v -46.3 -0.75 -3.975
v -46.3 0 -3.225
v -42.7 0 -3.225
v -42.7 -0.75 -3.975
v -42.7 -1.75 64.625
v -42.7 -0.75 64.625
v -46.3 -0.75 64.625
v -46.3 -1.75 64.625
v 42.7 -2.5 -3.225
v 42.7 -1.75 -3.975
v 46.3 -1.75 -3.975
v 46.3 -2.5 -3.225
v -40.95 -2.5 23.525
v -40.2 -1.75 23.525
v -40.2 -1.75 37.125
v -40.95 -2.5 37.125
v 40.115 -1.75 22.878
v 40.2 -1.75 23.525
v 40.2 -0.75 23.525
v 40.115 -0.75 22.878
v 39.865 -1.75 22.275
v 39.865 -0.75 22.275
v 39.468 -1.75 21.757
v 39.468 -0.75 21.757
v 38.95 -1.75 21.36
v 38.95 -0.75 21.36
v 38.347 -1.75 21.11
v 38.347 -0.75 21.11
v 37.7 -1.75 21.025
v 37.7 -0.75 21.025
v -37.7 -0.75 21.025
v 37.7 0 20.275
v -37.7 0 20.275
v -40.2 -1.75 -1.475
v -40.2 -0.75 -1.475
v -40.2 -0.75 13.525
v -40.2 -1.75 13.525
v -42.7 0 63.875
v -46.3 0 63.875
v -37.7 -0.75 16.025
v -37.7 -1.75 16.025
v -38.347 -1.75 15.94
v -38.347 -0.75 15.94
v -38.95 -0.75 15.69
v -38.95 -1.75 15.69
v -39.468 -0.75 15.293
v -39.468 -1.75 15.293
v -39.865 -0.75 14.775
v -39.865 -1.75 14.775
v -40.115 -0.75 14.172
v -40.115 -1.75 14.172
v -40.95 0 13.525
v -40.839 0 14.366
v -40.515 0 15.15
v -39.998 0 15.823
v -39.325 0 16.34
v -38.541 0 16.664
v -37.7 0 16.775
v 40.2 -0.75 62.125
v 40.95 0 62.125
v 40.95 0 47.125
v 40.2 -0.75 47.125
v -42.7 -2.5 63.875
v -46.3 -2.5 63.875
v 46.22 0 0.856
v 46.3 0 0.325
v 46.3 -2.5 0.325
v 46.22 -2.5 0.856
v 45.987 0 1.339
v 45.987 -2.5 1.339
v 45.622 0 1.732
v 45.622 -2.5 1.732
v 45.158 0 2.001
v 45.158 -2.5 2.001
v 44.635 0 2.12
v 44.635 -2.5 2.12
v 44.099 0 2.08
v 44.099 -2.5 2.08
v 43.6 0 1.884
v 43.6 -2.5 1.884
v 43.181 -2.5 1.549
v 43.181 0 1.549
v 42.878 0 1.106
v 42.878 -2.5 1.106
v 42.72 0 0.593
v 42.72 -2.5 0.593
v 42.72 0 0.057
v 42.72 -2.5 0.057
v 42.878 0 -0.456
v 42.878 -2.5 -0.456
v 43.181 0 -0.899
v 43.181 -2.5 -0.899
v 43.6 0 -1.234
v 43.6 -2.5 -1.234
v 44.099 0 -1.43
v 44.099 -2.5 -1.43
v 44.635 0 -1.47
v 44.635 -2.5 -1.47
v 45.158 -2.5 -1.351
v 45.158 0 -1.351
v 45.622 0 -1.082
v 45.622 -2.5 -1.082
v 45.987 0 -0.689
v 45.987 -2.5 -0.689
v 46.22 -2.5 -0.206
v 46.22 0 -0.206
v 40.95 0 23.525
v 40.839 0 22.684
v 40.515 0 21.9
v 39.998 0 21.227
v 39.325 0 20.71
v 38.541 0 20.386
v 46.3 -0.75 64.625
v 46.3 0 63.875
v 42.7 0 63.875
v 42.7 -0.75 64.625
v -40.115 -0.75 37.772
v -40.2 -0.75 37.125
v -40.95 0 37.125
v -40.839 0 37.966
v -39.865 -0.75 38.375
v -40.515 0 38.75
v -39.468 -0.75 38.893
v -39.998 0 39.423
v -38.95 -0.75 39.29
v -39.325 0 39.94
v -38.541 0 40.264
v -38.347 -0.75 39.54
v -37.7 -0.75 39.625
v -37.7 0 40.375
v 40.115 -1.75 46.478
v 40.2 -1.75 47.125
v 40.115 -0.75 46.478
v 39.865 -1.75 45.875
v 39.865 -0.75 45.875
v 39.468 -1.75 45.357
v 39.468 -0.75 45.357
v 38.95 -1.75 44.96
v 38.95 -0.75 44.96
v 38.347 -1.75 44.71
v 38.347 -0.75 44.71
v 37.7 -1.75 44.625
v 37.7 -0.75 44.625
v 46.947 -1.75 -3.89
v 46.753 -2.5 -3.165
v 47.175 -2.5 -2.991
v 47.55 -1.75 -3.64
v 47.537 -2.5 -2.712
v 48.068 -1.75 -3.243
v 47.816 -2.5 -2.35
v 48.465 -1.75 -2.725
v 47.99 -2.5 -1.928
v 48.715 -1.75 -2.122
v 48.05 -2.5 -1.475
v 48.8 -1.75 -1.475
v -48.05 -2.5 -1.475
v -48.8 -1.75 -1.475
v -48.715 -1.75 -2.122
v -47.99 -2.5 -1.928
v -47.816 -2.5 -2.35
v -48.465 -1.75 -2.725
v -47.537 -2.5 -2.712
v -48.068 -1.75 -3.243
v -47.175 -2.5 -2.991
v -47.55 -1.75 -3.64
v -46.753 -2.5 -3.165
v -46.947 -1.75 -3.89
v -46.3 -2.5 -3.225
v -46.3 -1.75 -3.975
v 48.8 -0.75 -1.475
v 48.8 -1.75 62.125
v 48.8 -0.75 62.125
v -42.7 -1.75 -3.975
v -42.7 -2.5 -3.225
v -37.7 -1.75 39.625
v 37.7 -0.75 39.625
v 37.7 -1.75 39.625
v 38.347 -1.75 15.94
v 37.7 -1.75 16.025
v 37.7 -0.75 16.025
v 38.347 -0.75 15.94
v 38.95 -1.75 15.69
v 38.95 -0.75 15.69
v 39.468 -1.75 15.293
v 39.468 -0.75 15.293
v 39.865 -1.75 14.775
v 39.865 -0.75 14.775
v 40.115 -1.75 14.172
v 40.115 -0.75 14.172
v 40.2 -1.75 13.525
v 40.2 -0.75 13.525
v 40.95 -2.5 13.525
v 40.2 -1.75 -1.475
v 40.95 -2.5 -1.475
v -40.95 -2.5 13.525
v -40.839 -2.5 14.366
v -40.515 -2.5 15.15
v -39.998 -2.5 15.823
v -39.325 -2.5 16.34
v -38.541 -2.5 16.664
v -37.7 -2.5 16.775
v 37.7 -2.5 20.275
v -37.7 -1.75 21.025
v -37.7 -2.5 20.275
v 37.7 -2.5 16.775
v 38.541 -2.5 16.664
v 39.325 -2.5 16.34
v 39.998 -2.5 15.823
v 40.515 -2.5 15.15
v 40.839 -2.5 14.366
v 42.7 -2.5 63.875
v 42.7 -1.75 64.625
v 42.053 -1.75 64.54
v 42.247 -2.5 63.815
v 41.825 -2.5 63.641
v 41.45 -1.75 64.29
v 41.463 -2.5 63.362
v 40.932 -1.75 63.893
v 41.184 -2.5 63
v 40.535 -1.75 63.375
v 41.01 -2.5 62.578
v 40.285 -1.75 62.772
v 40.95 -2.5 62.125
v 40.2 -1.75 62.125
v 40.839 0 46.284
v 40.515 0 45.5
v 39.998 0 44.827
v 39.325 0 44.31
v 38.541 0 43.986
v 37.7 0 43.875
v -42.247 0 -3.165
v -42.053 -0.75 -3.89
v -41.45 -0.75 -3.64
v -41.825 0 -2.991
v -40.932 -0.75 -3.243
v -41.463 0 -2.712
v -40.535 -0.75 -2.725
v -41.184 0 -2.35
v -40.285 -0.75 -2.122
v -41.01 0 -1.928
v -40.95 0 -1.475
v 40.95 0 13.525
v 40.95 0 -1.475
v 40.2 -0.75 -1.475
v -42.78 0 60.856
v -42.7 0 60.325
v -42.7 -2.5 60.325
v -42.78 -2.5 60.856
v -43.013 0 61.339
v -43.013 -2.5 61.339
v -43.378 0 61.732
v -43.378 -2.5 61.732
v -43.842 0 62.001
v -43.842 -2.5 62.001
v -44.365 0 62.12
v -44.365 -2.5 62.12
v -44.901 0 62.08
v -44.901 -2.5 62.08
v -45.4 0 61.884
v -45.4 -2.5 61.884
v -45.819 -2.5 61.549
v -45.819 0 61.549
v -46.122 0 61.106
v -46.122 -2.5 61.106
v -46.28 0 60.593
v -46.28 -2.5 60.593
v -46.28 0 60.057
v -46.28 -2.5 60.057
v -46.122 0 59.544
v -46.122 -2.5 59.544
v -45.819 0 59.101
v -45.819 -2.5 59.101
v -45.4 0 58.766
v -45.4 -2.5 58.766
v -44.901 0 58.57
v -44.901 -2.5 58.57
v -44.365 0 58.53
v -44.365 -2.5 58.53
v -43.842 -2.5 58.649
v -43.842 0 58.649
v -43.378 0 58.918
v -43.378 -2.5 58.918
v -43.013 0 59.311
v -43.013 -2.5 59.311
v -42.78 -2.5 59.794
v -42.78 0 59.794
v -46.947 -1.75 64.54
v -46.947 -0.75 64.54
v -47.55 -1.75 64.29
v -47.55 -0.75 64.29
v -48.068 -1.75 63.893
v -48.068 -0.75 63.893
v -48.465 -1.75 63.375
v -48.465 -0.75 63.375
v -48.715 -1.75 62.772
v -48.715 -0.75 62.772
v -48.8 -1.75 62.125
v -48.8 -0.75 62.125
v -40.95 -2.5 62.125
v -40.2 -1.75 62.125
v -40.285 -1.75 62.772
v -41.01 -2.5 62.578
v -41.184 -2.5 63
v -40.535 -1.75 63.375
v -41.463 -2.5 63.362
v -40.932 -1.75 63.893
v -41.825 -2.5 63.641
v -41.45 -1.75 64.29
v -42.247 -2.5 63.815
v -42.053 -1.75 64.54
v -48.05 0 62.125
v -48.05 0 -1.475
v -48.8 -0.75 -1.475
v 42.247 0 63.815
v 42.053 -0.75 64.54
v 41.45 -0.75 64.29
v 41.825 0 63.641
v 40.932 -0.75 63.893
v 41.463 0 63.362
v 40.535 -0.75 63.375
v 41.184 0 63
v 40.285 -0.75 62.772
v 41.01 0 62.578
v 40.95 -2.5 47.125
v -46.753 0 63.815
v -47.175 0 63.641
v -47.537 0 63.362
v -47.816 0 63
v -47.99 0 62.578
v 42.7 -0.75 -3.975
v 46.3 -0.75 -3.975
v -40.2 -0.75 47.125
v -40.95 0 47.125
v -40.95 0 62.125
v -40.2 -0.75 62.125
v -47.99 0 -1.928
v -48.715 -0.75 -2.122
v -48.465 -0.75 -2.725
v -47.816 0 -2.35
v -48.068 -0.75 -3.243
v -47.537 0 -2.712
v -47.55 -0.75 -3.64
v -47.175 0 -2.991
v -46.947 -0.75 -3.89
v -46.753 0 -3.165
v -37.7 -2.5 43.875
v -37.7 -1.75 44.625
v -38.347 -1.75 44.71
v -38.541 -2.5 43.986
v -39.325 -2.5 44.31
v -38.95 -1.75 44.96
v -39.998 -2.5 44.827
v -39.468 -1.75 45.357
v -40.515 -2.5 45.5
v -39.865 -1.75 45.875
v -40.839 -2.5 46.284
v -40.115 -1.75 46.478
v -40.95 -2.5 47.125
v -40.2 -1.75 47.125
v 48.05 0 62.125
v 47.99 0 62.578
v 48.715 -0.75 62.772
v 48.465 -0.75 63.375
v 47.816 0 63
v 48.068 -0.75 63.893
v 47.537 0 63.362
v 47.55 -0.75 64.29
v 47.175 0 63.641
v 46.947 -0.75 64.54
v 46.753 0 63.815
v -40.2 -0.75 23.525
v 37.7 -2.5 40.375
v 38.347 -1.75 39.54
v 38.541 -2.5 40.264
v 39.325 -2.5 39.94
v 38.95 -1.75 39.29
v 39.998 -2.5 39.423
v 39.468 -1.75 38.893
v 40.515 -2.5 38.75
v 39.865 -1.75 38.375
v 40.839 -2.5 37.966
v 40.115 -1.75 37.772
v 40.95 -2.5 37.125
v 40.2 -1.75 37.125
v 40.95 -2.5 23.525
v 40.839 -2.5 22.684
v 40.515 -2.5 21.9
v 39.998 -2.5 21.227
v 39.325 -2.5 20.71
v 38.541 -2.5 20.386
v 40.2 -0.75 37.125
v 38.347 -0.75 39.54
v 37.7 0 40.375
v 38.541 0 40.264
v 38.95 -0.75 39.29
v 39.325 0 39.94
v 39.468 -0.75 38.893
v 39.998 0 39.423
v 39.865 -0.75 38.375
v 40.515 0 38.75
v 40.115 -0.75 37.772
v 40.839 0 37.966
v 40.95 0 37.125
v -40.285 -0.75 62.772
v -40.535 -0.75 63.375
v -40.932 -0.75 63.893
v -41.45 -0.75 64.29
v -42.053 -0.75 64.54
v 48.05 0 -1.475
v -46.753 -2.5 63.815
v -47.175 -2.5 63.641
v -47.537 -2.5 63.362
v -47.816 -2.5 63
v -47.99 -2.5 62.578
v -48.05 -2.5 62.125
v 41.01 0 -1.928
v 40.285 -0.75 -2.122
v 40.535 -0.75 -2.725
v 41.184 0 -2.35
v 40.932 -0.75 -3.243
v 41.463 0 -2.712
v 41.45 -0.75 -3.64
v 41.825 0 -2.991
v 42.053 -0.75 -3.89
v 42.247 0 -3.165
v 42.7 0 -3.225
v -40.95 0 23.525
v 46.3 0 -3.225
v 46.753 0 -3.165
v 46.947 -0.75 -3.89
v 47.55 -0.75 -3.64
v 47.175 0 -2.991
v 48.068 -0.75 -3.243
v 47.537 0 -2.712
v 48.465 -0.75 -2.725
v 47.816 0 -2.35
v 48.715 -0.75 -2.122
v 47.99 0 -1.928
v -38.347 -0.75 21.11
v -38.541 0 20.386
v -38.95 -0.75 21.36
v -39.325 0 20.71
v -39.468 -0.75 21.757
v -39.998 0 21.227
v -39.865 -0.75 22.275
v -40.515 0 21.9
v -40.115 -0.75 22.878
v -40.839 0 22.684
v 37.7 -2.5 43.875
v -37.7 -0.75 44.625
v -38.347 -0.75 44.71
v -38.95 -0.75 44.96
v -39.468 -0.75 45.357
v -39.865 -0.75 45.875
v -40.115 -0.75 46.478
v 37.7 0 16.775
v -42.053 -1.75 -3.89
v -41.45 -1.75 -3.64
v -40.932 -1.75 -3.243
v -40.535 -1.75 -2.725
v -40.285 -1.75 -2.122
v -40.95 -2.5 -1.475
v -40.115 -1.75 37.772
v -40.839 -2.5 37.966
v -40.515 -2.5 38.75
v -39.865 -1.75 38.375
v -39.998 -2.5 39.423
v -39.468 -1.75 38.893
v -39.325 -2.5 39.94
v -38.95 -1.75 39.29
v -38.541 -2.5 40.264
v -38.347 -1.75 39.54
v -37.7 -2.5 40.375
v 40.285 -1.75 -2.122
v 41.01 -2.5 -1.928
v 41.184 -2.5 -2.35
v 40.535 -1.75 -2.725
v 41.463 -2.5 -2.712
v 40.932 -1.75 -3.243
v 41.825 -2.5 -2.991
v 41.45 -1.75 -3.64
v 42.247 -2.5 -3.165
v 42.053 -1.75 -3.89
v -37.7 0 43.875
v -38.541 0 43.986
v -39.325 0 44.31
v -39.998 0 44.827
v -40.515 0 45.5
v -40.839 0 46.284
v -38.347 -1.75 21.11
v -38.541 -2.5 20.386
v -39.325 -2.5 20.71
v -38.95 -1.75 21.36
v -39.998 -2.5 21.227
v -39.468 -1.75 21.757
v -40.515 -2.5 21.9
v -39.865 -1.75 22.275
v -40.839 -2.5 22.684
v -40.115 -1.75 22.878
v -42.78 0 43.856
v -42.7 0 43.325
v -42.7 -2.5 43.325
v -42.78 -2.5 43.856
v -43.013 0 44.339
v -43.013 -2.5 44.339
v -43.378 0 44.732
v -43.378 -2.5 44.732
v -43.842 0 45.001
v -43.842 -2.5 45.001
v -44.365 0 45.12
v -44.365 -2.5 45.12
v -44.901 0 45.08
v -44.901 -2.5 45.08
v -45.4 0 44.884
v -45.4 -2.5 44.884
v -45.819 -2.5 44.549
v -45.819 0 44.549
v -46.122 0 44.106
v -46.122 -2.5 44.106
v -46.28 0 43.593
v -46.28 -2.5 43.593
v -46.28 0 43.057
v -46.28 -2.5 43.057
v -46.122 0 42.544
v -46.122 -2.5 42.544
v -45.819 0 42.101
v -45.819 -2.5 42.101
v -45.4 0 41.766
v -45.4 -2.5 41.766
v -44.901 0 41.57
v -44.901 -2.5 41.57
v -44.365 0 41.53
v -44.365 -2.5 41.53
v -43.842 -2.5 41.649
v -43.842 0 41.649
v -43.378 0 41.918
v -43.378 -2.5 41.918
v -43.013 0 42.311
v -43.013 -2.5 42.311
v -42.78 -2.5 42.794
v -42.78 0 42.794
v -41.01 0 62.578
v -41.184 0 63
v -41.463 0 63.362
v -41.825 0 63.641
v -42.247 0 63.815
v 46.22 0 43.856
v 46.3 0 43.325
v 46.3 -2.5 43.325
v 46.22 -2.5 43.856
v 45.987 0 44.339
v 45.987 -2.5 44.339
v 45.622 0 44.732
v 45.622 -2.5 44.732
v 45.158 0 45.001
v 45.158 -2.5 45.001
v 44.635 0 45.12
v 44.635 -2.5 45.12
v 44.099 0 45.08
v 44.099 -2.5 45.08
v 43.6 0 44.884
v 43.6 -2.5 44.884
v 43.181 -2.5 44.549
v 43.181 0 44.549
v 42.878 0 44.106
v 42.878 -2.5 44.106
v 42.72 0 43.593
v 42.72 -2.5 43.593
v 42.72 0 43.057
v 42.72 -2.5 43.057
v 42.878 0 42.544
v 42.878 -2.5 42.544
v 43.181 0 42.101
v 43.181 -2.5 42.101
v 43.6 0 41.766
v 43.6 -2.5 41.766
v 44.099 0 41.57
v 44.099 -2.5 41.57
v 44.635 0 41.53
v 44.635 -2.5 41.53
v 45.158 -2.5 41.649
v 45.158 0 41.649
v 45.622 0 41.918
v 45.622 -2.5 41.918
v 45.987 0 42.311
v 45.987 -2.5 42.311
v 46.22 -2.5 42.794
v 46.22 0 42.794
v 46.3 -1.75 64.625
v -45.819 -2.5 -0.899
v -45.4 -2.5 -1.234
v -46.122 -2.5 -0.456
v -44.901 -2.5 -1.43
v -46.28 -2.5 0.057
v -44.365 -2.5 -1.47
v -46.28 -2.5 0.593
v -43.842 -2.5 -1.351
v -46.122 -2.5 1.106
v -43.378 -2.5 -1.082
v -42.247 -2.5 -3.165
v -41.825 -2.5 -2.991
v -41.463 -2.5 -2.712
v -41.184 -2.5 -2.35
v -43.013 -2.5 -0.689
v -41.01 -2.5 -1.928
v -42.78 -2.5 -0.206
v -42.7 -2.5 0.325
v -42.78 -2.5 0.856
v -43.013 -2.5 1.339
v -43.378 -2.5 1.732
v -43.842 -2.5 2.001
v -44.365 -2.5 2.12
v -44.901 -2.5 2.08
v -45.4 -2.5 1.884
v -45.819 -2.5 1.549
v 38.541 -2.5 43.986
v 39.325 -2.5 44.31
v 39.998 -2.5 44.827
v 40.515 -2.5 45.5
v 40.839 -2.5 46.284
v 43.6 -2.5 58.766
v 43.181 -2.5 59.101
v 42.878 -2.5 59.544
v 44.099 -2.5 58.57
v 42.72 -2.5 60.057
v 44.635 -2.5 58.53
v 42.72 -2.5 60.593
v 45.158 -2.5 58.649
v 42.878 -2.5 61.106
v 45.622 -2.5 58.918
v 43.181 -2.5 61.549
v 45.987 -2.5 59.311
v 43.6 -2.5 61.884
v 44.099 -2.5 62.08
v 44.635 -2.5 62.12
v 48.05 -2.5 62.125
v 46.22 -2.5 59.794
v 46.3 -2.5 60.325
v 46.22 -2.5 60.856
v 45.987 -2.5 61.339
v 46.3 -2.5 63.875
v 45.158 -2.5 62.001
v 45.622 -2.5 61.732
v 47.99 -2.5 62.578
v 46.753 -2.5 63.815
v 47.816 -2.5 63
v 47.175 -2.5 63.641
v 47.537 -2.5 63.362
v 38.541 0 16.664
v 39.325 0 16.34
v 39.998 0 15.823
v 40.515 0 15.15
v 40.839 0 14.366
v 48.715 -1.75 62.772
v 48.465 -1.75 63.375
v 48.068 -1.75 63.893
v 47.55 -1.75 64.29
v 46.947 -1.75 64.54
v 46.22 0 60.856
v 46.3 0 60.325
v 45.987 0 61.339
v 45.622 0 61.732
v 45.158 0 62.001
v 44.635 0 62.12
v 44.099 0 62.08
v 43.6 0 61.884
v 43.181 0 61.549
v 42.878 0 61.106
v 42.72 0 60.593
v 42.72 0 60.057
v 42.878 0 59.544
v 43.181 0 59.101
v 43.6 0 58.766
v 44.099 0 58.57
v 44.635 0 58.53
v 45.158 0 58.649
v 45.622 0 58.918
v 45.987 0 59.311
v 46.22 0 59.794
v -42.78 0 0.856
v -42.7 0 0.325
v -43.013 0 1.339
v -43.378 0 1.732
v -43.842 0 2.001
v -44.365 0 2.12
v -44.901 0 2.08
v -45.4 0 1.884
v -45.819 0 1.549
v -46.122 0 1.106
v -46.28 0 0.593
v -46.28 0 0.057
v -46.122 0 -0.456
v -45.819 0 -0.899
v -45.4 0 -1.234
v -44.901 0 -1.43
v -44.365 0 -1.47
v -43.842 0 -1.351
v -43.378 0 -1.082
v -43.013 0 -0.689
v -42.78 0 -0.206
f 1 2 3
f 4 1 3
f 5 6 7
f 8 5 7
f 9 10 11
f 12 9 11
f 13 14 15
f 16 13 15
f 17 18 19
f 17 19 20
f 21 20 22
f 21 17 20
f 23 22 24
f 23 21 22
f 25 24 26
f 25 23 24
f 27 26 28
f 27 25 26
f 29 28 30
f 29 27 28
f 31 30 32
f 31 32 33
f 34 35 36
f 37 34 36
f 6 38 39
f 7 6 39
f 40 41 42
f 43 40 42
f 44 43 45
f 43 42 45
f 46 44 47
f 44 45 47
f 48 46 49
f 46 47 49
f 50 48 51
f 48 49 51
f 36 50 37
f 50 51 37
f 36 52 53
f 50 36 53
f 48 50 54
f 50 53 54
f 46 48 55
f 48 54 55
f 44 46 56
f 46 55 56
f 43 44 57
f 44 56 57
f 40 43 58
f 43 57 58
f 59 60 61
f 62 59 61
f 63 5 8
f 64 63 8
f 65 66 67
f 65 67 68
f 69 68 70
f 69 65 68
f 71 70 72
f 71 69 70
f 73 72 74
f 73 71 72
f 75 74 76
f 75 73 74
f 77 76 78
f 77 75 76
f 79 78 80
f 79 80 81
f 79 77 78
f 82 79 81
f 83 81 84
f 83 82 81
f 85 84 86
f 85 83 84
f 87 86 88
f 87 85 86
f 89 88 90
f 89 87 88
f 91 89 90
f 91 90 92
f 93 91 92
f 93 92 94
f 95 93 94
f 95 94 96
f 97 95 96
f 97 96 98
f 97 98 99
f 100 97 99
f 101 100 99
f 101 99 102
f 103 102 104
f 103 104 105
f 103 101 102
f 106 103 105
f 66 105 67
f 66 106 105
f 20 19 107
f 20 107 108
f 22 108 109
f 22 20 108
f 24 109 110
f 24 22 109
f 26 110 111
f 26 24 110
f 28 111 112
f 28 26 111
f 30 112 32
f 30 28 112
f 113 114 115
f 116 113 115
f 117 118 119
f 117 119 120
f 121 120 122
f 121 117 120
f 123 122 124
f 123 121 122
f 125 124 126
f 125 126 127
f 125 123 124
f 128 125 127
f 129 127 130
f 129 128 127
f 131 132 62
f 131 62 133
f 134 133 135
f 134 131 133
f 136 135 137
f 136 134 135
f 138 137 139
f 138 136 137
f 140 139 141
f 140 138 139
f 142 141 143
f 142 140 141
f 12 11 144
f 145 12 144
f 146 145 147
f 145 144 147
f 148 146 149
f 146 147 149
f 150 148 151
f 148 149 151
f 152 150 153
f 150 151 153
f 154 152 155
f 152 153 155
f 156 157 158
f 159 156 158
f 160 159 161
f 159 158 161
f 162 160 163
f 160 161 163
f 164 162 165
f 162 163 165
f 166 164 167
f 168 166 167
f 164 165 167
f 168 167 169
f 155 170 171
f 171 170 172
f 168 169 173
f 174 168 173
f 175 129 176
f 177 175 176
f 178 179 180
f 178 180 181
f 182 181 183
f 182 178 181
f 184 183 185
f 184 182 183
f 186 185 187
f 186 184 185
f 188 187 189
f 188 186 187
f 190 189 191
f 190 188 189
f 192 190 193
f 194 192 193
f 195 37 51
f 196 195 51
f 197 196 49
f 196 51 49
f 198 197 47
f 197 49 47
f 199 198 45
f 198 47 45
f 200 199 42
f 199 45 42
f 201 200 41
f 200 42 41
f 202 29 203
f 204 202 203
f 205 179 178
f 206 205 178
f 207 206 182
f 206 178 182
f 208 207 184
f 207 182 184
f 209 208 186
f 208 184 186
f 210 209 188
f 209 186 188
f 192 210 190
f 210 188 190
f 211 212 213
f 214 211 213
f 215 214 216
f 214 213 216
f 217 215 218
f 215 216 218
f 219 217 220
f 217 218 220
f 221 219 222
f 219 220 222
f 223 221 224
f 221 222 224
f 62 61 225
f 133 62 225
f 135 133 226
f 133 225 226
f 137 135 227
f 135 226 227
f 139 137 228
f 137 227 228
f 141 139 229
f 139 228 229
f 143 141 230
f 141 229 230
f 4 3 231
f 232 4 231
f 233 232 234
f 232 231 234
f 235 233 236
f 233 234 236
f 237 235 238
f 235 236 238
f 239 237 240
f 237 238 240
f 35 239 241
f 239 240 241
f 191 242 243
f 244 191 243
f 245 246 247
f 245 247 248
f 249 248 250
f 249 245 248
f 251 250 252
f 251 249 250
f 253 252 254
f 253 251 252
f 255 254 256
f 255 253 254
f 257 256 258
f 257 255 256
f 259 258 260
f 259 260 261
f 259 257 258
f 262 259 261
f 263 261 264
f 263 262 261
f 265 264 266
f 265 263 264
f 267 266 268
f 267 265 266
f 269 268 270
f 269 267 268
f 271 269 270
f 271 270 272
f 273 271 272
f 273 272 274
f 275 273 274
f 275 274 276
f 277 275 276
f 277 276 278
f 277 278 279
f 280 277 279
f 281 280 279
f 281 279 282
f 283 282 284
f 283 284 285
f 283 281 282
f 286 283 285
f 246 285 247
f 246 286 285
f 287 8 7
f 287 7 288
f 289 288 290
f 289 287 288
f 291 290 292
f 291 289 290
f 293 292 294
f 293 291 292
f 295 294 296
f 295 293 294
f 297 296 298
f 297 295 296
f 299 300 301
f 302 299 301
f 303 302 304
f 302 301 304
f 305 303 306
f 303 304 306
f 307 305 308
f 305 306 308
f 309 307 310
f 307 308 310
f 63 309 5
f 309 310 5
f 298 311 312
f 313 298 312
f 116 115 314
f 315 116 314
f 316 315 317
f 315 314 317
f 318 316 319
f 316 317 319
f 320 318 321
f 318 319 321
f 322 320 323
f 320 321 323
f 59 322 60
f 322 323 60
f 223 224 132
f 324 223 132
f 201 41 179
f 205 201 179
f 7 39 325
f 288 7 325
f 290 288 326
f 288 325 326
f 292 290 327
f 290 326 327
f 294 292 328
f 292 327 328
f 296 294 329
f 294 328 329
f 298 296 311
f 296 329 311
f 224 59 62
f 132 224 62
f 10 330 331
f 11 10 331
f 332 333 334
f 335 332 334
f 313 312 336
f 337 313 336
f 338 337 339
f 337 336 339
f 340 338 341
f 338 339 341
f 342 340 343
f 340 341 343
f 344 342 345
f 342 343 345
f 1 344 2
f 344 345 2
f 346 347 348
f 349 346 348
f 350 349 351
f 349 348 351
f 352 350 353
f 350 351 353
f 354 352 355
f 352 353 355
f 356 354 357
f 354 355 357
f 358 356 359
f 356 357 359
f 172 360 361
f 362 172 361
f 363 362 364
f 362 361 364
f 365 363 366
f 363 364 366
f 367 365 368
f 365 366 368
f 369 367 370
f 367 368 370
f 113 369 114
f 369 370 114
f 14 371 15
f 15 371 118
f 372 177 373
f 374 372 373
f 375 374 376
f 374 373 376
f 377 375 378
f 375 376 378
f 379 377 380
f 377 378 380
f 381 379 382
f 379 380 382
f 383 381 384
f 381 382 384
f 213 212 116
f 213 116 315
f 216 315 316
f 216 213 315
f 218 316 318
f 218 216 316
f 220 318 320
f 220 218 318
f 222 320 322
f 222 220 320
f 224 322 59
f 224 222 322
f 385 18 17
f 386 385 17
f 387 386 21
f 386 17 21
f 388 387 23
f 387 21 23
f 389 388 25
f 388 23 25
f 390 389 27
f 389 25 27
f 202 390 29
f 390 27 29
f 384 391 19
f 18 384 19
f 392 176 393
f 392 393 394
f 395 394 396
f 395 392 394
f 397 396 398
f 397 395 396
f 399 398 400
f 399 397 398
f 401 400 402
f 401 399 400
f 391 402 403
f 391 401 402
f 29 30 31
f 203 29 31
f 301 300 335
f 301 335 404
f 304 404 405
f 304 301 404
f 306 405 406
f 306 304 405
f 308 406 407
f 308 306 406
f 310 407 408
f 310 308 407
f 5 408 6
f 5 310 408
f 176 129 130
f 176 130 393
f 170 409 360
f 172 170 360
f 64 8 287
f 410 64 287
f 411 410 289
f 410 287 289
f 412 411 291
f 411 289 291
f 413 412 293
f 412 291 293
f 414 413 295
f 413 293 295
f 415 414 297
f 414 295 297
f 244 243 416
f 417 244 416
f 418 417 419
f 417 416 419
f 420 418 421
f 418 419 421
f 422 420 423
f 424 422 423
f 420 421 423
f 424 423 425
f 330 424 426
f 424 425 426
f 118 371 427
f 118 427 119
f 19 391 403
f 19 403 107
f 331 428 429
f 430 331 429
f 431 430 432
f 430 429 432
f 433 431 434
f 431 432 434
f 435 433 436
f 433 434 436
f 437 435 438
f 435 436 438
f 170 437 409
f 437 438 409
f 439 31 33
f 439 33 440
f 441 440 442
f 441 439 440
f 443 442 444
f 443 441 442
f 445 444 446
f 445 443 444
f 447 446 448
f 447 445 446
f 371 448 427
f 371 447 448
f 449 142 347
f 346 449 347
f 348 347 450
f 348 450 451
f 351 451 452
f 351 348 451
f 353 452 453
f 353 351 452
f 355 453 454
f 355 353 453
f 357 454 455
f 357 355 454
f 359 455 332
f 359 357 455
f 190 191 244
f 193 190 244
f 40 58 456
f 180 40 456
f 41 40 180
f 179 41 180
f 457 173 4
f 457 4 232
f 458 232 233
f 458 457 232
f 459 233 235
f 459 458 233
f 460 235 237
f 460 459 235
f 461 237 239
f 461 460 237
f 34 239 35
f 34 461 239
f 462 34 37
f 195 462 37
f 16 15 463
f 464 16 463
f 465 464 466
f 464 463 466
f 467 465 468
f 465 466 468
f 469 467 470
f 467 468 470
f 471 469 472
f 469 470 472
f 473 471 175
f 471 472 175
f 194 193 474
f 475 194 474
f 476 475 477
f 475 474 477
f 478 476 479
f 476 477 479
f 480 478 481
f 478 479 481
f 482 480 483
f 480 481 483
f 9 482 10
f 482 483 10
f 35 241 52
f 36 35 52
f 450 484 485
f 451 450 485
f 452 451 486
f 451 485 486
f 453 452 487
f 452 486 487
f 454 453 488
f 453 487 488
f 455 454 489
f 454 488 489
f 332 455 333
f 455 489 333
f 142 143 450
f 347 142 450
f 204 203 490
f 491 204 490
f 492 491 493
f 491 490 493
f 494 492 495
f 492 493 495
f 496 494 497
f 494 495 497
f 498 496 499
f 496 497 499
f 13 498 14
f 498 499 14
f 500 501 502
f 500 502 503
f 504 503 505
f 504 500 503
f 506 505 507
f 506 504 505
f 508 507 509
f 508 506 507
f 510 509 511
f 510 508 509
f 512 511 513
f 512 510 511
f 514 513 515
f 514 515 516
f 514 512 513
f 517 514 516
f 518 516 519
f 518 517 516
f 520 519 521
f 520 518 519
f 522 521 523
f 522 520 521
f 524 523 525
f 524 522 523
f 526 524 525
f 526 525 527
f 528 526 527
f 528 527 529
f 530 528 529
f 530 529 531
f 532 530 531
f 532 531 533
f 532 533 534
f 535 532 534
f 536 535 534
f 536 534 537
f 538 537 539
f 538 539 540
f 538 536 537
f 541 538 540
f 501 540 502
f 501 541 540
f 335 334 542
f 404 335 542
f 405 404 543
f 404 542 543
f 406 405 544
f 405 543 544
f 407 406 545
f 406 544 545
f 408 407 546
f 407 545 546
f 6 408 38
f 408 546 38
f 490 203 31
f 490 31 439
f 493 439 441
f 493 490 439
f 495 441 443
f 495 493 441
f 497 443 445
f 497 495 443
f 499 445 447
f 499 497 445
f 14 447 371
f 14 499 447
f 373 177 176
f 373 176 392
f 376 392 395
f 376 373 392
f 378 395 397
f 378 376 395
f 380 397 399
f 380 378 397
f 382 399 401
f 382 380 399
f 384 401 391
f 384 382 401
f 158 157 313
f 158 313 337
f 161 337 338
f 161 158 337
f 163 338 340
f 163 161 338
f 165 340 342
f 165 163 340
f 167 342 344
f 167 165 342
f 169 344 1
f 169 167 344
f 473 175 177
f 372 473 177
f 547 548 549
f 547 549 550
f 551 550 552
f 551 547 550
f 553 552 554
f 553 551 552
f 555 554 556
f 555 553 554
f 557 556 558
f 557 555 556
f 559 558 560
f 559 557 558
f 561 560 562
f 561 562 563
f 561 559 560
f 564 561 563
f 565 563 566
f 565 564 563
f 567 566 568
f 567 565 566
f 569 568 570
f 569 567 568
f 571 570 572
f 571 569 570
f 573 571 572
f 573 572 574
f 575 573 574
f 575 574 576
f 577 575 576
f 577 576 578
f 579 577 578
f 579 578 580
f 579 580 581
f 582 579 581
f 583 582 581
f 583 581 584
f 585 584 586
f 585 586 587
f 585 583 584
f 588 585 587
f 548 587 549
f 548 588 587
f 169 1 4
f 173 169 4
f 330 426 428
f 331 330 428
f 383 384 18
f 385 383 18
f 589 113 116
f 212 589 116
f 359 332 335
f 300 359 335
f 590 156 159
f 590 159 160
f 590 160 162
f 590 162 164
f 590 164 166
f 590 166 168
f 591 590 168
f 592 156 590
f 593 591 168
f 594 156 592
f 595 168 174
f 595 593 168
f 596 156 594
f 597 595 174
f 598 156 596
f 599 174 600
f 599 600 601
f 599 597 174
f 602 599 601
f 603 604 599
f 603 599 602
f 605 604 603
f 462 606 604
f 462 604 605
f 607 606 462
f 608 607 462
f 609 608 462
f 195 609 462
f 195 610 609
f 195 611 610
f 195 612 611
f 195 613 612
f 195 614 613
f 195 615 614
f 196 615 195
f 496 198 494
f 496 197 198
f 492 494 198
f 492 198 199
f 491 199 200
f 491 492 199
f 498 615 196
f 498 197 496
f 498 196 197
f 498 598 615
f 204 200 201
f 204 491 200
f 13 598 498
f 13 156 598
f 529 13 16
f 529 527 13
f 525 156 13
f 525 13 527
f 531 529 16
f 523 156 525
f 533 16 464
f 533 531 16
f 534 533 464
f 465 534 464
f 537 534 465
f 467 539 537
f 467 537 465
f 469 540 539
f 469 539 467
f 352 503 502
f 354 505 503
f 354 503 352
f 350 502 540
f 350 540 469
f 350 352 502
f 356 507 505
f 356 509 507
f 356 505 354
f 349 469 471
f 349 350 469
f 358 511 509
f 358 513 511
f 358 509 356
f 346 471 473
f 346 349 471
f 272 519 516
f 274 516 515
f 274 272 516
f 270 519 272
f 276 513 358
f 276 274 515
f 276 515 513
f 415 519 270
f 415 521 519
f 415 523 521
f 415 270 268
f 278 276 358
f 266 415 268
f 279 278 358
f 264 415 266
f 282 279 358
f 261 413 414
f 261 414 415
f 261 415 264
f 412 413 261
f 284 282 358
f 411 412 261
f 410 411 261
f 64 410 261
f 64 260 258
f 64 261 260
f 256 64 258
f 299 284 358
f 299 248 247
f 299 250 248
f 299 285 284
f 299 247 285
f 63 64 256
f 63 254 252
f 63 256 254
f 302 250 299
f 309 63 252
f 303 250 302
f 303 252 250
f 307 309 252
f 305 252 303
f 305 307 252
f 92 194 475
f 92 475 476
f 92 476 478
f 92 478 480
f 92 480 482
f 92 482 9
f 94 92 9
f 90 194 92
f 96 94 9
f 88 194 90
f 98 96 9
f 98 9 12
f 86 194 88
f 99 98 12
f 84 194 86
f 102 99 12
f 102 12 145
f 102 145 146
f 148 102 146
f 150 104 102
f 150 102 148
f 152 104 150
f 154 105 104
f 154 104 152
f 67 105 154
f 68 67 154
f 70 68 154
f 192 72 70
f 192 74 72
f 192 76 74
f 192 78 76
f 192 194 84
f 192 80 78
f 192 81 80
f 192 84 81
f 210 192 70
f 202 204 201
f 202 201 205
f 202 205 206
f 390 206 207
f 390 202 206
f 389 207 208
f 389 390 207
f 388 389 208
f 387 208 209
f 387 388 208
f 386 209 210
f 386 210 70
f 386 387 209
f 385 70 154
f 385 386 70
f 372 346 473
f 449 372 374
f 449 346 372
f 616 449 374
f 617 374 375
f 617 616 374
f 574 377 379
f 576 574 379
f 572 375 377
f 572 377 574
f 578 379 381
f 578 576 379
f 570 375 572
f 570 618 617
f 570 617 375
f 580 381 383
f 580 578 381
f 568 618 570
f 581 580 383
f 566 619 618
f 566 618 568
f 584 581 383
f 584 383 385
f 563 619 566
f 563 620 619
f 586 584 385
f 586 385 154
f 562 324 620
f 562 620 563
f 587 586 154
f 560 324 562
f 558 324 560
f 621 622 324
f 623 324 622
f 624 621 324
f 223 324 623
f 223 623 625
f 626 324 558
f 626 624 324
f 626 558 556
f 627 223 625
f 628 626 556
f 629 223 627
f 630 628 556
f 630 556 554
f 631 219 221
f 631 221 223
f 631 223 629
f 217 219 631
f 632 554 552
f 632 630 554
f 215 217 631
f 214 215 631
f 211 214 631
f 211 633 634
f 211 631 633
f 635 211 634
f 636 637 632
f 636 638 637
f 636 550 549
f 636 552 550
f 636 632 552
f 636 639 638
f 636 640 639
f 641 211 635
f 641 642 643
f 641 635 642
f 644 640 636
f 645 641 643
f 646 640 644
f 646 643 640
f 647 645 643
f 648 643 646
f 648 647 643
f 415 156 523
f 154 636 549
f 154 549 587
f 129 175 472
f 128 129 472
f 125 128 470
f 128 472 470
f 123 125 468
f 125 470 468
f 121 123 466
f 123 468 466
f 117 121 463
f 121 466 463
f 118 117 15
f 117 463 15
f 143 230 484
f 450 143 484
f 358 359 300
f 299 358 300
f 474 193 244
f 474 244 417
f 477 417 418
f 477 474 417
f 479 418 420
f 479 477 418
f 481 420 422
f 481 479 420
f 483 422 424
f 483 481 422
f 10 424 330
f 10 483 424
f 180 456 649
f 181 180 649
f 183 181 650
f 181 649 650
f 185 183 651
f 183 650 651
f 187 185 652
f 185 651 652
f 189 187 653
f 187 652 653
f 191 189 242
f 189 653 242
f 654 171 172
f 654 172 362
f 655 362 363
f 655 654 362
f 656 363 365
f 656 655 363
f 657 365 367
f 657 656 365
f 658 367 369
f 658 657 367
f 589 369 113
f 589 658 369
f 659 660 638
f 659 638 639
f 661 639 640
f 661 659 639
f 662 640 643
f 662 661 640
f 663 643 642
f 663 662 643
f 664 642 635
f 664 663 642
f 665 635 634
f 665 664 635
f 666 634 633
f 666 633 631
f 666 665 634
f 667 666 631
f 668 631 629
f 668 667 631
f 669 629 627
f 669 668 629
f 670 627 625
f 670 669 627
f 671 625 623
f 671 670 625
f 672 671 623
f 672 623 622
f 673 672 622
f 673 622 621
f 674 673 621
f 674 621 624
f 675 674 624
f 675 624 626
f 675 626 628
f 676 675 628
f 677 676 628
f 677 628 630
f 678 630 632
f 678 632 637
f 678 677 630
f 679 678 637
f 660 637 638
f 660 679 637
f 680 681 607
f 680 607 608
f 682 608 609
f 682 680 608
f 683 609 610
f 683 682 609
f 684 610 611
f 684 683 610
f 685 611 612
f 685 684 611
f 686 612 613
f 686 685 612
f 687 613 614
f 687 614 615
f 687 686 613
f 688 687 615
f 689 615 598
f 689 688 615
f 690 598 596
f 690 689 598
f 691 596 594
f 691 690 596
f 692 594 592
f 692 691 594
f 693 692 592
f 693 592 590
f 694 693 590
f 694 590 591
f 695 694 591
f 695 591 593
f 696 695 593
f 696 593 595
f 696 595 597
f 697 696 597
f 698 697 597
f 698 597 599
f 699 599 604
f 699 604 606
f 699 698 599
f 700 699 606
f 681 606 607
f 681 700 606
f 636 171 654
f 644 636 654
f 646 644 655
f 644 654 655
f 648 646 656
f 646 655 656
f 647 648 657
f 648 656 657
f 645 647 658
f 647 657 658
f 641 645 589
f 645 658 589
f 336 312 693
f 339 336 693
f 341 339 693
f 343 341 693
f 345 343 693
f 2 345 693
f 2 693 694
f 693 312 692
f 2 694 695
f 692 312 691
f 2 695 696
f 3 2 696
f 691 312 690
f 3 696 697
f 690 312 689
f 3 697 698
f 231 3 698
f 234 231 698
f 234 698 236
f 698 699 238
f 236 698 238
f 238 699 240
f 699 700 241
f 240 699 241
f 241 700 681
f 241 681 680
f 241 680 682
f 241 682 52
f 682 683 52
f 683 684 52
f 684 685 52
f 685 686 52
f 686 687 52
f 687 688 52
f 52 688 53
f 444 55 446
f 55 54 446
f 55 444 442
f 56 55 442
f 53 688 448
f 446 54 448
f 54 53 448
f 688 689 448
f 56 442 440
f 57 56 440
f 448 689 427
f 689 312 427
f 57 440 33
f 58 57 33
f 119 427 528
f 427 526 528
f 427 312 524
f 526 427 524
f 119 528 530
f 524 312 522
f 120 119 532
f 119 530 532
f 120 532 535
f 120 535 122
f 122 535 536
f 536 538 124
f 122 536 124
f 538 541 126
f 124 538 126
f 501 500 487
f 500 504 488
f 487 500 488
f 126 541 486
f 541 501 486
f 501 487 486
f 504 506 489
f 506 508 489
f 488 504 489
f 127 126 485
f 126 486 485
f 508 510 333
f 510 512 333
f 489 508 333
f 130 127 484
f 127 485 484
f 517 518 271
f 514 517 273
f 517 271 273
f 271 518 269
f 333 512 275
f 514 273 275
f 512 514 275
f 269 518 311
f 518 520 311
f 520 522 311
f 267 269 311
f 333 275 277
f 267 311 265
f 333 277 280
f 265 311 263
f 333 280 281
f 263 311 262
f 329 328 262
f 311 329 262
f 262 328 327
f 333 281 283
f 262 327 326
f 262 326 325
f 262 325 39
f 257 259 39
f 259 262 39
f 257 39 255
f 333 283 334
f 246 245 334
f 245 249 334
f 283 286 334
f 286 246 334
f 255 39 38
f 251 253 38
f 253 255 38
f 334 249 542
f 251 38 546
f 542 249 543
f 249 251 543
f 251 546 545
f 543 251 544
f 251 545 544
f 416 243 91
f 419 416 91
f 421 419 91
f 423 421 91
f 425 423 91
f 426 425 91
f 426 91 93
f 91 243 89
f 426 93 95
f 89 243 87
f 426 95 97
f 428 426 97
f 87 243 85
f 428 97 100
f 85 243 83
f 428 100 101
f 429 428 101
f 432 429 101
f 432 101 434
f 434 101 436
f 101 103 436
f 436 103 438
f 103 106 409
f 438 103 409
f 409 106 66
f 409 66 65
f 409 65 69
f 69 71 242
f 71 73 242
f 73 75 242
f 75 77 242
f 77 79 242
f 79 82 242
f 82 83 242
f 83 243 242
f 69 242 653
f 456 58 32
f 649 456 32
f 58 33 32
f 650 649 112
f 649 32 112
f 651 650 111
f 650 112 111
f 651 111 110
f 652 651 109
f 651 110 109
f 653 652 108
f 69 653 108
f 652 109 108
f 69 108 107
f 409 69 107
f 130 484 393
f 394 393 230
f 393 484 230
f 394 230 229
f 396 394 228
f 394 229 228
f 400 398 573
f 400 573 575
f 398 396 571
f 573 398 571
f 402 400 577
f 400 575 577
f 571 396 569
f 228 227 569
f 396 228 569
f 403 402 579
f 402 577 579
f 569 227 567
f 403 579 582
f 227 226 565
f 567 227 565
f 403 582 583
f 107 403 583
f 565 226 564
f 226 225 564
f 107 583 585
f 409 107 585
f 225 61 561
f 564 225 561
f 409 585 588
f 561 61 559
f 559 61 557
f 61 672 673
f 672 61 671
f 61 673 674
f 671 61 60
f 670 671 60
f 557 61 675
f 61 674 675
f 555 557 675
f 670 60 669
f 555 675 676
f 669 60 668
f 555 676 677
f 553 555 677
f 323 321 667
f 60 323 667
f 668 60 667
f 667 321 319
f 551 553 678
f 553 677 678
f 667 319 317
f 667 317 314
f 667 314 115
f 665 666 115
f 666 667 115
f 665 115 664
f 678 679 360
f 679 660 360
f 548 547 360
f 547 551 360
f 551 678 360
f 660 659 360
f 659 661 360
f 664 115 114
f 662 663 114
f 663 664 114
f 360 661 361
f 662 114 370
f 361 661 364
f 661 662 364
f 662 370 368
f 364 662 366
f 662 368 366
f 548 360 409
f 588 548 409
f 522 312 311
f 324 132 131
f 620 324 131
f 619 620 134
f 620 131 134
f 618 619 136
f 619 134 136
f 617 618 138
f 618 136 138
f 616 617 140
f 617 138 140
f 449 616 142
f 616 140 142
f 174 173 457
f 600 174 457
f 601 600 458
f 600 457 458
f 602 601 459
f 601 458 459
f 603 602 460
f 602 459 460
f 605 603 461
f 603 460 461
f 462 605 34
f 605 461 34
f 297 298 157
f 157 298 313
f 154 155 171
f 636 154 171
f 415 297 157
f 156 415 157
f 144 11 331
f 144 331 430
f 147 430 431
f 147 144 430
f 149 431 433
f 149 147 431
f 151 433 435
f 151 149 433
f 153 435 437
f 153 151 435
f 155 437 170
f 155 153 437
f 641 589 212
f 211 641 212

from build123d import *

# Parameters (mm, degrees)
F0_W     = 0.0285906434
F0_H     = 5
F0_W_2   = 40.2
F0_R     = 1.8
F1_DEPTH = 2.5
F2_R     = 2.5
F3_SIZE  = 0.75


# Not quite as in the source:
# - a feature names something its author has since deleted; it is built from what else it names


with BuildPart() as f1:
    # F0 (on Front) → F1 (new body)
    with BuildSketch(Plane.XZ):
        with Locations((-40.2142953217, 18.525)):
            Rectangle(F0_W, F0_H)
        with Locations((40.2142953217, 18.525)):
            Rectangle(F0_W, F0_H)
        with Locations((-20.1, 18.525)):
            Rectangle(F0_W_2, F0_H)
        with Locations((20.1, 18.525)):
            Rectangle(F0_W_2, F0_H)
        with Locations((20.1, 42.125)):
            Rectangle(F0_W_2, F0_H)
        Polygon((40.2, 64.625), (40.2, 44.625), (40.2, 39.625), (40.2, 21.025), (40.2285906434, 21.025), (40.2285906434, 16.025), (40.2, 16.025), (40.2, -3.975), (48.8, -3.975), (48.8, 64.625), align=None)
        with Locations((44.5, 0.325)):
            Circle(F0_R, mode=Mode.SUBTRACT)
        with Locations((44.5, 43.325)):
            Circle(F0_R, mode=Mode.SUBTRACT)
        with Locations((44.5, 60.325)):
            Circle(F0_R, mode=Mode.SUBTRACT)
        with Locations((-20.1, 42.125)):
            Rectangle(F0_W_2, F0_H)
        Polygon((-40.2, 64.625), (-48.8, 64.625), (-48.8, -3.975), (-40.2, -3.975), (-40.2, 16.025), (-40.2285906434, 16.025), (-40.2285906434, 21.025), (-40.2, 21.025), (-40.2, 39.625), (-40.2, 44.625), align=None)
        with Locations((-44.5, 0.325)):
            Circle(F0_R, mode=Mode.SUBTRACT)
        with Locations((-44.5, 43.325)):
            Circle(F0_R, mode=Mode.SUBTRACT)
        with Locations((-44.5, 60.325)):
            Circle(F0_R, mode=Mode.SUBTRACT)
    extrude(amount=F1_DEPTH)

    # F2
    f2_edges = [f1.edges().sort_by_distance(p)[0] for p in [
        (-40.2, -1.25, 44.625),
        (40.2, -1.25, 44.625),
        (-40.2, -1.25, 39.625),
        (40.2, -1.25, 39.625),
        (-40.2, -1.25, 21.025),
        (40.2, -1.25, 21.025),
        (-40.2, -1.25, 16.025),
        (40.2, -1.25, 16.025),
        (40.2, -1.25, -3.975),
        (48.8, -1.25, -3.975),
        (-48.8, -1.25, -3.975),
        (-40.2, -1.25, -3.975),
        (48.8, -1.25, 64.625),
        (40.2, -1.25, 64.625),
        (-48.8, -1.25, 64.625),
        (-40.2, -1.25, 64.625),
    ]]
    fillet(f2_edges, radius=F2_R)

    # F3
    f3_edges = [f1.edges().sort_by_distance(p)[0] for p in [
        (0, 0, 16.025),
        (0, 0, 39.625),
        (-44.5, -2.5, 64.625),
        (0, -2.5, 39.625),
    ]]
    chamfer(f3_edges, length=F3_SIZE)


solid = f1.part
